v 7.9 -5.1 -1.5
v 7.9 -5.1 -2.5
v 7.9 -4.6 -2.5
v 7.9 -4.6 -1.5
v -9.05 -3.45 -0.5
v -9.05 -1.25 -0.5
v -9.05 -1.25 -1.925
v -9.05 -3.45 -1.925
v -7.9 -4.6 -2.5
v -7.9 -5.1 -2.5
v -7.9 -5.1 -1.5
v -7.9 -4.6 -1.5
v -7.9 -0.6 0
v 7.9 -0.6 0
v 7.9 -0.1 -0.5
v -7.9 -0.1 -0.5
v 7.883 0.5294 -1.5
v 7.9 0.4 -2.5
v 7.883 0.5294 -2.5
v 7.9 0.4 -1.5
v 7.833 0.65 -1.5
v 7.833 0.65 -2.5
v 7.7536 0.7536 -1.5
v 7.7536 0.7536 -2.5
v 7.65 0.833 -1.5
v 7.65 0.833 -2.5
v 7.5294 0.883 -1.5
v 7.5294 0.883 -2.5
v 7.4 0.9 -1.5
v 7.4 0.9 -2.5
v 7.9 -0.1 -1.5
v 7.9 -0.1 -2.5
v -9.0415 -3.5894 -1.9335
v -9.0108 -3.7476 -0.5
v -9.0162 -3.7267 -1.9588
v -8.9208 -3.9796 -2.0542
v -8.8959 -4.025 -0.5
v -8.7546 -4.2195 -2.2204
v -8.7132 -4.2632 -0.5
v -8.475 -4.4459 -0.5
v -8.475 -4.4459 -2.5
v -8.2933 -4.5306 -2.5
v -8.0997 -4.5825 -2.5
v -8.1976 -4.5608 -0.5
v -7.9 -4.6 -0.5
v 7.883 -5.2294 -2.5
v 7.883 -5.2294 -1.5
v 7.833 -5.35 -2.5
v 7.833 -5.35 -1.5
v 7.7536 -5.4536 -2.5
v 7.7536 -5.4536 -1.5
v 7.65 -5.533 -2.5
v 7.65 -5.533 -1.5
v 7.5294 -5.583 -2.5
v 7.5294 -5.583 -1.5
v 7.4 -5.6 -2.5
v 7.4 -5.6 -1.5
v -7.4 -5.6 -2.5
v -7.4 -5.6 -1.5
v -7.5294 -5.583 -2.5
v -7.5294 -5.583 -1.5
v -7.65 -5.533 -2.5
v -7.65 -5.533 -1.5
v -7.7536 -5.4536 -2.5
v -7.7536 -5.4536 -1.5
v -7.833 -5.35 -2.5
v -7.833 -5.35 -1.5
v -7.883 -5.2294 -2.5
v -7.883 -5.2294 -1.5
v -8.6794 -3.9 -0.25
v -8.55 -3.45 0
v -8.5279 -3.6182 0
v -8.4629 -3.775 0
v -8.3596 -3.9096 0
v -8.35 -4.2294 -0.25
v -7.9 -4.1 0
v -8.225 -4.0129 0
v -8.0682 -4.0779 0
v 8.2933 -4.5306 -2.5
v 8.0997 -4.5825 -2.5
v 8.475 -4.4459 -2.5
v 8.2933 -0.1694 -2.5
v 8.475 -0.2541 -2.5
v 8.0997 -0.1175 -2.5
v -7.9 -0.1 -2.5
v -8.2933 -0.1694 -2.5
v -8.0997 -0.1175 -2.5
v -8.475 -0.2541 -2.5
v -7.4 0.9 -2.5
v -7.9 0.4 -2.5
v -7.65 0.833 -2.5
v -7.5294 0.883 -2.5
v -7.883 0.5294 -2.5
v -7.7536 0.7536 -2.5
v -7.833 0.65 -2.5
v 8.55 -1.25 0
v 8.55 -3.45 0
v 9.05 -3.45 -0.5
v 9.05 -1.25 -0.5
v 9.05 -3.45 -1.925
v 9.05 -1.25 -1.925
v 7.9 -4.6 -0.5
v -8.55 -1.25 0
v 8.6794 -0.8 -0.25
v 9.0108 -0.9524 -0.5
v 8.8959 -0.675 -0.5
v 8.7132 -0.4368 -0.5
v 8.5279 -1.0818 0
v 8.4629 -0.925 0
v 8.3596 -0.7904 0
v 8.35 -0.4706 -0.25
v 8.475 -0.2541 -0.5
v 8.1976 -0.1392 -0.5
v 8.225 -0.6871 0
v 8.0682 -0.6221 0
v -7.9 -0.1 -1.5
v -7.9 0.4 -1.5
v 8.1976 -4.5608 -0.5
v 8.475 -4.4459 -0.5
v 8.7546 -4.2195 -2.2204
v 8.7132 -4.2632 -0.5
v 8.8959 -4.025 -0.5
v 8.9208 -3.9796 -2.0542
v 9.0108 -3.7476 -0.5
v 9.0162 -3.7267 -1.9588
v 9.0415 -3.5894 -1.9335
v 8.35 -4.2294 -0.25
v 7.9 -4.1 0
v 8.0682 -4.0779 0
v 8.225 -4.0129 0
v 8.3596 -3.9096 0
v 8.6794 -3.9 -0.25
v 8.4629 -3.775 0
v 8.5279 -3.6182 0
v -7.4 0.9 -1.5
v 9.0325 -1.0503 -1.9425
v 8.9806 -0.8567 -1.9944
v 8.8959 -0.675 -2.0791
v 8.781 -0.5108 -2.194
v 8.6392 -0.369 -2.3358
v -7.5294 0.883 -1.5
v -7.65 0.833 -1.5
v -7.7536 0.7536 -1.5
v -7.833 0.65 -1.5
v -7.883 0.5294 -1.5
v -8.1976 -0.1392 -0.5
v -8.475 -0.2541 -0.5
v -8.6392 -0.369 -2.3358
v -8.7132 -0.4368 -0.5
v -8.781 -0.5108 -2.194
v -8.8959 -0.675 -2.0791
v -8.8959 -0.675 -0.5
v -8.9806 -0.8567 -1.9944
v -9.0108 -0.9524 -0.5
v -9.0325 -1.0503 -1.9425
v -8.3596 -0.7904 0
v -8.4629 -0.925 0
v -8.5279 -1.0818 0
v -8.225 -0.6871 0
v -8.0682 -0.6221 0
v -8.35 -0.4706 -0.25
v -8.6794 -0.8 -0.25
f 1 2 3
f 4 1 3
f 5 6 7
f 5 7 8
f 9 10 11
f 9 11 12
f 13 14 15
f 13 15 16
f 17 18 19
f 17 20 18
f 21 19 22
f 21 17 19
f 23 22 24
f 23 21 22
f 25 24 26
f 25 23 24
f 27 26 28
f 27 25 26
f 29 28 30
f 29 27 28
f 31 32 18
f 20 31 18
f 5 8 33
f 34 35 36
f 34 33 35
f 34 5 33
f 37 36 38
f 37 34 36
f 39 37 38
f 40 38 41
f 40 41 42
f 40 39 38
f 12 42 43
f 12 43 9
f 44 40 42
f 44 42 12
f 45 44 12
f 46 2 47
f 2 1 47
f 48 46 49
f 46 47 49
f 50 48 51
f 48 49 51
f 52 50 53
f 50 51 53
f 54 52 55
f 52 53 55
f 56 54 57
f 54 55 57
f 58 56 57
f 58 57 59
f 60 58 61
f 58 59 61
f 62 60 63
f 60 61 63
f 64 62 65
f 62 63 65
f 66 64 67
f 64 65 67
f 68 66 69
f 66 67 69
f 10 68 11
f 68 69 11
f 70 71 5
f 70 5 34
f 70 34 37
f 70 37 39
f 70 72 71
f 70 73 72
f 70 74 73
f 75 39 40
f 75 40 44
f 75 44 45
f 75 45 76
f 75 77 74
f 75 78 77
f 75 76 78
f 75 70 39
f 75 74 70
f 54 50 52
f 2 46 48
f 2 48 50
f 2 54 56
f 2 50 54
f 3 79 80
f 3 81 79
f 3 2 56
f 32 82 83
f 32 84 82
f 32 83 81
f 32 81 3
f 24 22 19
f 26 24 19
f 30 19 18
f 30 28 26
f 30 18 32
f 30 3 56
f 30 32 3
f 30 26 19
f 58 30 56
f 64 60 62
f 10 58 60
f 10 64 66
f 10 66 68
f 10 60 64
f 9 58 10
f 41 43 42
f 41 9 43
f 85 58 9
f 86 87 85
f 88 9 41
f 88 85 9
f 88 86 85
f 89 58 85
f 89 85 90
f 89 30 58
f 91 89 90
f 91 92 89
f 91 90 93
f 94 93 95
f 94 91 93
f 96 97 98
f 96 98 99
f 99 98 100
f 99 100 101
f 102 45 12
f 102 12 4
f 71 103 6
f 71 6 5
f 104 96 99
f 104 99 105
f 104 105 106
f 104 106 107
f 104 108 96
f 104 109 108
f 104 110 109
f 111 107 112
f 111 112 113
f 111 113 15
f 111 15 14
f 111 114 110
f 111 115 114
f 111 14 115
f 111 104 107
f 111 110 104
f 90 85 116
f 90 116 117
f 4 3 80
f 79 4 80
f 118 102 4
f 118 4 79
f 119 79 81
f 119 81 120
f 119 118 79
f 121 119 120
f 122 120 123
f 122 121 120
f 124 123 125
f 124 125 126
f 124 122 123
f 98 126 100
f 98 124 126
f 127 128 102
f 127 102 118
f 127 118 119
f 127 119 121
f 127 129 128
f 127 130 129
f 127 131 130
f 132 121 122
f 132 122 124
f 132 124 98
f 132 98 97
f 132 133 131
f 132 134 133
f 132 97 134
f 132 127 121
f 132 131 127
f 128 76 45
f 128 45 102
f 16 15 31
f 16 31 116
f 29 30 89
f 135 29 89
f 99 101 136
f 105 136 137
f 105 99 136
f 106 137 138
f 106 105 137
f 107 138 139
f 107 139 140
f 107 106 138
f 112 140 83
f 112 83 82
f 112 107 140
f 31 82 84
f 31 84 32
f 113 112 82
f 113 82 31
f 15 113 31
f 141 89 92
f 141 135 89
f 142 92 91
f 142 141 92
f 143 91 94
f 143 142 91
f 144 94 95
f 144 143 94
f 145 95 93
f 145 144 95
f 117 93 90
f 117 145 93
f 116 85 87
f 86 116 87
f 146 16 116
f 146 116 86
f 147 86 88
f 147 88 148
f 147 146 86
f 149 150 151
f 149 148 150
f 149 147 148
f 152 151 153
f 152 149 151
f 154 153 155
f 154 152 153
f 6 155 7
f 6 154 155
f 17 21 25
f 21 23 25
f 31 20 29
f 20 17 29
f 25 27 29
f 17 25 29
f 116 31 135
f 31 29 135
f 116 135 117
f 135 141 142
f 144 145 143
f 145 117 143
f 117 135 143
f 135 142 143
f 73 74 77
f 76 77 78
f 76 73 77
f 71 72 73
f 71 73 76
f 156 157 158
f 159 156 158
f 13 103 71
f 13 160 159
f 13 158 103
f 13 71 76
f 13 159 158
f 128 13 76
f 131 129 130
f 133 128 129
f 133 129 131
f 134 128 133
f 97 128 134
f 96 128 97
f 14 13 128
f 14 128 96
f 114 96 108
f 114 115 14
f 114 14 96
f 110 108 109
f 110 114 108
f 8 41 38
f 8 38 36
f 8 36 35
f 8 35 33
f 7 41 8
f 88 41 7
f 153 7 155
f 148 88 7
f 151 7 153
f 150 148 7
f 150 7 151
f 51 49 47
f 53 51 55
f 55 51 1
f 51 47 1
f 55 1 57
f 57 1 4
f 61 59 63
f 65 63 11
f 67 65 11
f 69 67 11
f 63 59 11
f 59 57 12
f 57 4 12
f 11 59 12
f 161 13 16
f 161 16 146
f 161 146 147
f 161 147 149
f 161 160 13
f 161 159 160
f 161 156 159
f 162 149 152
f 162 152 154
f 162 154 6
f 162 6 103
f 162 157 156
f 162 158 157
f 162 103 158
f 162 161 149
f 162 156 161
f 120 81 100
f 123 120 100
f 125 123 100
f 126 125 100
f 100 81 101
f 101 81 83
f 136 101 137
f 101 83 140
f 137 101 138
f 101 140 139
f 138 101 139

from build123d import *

# Parameters (mm, degrees)
EXTRUDE_1_DEPTH     = 2.5
SKETCH_2_W          = 15.8
SKETCH_2_H          = 6.5
EXTRUDE_2_DEPTH     = 1
FILLET_1_R          = 0.5
CHAMFER_1_SIZE      = 0.5
CUT_EXTRUDE_1_DEPTH = 12.419391402


with BuildPart() as part:
    # 草图1 → 凸台-拉伸1 (new body)
    with BuildSketch(Plane.XY):
        with BuildLine():
            Line((-9.05, -1.25), (-9.05, -3.45))
            ThreePointArc((-9.05, -3.45), (-8.713172798, -4.263172798), (-7.9, -4.6))
            Line((-7.9, -4.6), (7.9, -4.6))
            ThreePointArc((7.9, -4.6), (8.713172798, -4.263172798), (9.05, -3.45))
            Line((9.05, -3.45), (9.05, -1.25))
            ThreePointArc((9.05, -1.25), (8.713172798, -0.436827202), (7.9, -0.1))
            Line((7.9, -0.1), (-7.9, -0.1))
            ThreePointArc((-7.9, -0.1), (-8.713172798, -0.436827202), (-9.05, -1.25))
        make_face()
    extrude(amount=-EXTRUDE_1_DEPTH)

    # 草图2 → 凸台-拉伸2 (add)
    with BuildSketch(Plane(origin=(0, 0, -2.5), x_dir=(-1, 0, 0), z_dir=(0, 0, -1))):
        with Locations((0, -2.35)):
            Rectangle(SKETCH_2_W, SKETCH_2_H)
    extrude(amount=-EXTRUDE_2_DEPTH)

    # 圆角1
    fillet_1_edges = [part.edges().sort_by_distance(p)[0] for p in [
        (-7.9, 0.9, -2),
        (-7.9, -5.6, -2),
        (7.9, -5.6, -2),
        (7.9, 0.9, -2),
    ]]
    fillet(fillet_1_edges, radius=FILLET_1_R)

    # 倒角1
    chamfer_1_edges = [part.edges().sort_by_distance(p)[0] for p in [
        (-9.05, -2.35, 0),
        (-8.713172798, -0.436827202, 0),
        (0, -0.1, 0),
        (8.713172798, -0.436827202, 0),
        (9.05, -2.35, 0),
        (8.713172798, -4.263172798, 0),
        (0, -4.6, 0),
        (-8.713172798, -4.263172798, 0),
    ]]
    chamfer(chamfer_1_edges, length=CHAMFER_1_SIZE)

    # 草图3 → 切除-拉伸1 (cut, through all)
    with BuildSketch(Plane(origin=(0, 0.9, 0), x_dir=(1, 0, 0), z_dir=(0, 1, 0))):
        Polygon((8.475, 2.5), (9.05, 1.925), (9.05, 2.5), align=None)
        Polygon((-9.05, 1.925), (-9.05, 2.5), (-8.475, 2.5), align=None)
    extrude(amount=-CUT_EXTRUDE_1_DEPTH, mode=Mode.SUBTRACT)


solid = part.part
